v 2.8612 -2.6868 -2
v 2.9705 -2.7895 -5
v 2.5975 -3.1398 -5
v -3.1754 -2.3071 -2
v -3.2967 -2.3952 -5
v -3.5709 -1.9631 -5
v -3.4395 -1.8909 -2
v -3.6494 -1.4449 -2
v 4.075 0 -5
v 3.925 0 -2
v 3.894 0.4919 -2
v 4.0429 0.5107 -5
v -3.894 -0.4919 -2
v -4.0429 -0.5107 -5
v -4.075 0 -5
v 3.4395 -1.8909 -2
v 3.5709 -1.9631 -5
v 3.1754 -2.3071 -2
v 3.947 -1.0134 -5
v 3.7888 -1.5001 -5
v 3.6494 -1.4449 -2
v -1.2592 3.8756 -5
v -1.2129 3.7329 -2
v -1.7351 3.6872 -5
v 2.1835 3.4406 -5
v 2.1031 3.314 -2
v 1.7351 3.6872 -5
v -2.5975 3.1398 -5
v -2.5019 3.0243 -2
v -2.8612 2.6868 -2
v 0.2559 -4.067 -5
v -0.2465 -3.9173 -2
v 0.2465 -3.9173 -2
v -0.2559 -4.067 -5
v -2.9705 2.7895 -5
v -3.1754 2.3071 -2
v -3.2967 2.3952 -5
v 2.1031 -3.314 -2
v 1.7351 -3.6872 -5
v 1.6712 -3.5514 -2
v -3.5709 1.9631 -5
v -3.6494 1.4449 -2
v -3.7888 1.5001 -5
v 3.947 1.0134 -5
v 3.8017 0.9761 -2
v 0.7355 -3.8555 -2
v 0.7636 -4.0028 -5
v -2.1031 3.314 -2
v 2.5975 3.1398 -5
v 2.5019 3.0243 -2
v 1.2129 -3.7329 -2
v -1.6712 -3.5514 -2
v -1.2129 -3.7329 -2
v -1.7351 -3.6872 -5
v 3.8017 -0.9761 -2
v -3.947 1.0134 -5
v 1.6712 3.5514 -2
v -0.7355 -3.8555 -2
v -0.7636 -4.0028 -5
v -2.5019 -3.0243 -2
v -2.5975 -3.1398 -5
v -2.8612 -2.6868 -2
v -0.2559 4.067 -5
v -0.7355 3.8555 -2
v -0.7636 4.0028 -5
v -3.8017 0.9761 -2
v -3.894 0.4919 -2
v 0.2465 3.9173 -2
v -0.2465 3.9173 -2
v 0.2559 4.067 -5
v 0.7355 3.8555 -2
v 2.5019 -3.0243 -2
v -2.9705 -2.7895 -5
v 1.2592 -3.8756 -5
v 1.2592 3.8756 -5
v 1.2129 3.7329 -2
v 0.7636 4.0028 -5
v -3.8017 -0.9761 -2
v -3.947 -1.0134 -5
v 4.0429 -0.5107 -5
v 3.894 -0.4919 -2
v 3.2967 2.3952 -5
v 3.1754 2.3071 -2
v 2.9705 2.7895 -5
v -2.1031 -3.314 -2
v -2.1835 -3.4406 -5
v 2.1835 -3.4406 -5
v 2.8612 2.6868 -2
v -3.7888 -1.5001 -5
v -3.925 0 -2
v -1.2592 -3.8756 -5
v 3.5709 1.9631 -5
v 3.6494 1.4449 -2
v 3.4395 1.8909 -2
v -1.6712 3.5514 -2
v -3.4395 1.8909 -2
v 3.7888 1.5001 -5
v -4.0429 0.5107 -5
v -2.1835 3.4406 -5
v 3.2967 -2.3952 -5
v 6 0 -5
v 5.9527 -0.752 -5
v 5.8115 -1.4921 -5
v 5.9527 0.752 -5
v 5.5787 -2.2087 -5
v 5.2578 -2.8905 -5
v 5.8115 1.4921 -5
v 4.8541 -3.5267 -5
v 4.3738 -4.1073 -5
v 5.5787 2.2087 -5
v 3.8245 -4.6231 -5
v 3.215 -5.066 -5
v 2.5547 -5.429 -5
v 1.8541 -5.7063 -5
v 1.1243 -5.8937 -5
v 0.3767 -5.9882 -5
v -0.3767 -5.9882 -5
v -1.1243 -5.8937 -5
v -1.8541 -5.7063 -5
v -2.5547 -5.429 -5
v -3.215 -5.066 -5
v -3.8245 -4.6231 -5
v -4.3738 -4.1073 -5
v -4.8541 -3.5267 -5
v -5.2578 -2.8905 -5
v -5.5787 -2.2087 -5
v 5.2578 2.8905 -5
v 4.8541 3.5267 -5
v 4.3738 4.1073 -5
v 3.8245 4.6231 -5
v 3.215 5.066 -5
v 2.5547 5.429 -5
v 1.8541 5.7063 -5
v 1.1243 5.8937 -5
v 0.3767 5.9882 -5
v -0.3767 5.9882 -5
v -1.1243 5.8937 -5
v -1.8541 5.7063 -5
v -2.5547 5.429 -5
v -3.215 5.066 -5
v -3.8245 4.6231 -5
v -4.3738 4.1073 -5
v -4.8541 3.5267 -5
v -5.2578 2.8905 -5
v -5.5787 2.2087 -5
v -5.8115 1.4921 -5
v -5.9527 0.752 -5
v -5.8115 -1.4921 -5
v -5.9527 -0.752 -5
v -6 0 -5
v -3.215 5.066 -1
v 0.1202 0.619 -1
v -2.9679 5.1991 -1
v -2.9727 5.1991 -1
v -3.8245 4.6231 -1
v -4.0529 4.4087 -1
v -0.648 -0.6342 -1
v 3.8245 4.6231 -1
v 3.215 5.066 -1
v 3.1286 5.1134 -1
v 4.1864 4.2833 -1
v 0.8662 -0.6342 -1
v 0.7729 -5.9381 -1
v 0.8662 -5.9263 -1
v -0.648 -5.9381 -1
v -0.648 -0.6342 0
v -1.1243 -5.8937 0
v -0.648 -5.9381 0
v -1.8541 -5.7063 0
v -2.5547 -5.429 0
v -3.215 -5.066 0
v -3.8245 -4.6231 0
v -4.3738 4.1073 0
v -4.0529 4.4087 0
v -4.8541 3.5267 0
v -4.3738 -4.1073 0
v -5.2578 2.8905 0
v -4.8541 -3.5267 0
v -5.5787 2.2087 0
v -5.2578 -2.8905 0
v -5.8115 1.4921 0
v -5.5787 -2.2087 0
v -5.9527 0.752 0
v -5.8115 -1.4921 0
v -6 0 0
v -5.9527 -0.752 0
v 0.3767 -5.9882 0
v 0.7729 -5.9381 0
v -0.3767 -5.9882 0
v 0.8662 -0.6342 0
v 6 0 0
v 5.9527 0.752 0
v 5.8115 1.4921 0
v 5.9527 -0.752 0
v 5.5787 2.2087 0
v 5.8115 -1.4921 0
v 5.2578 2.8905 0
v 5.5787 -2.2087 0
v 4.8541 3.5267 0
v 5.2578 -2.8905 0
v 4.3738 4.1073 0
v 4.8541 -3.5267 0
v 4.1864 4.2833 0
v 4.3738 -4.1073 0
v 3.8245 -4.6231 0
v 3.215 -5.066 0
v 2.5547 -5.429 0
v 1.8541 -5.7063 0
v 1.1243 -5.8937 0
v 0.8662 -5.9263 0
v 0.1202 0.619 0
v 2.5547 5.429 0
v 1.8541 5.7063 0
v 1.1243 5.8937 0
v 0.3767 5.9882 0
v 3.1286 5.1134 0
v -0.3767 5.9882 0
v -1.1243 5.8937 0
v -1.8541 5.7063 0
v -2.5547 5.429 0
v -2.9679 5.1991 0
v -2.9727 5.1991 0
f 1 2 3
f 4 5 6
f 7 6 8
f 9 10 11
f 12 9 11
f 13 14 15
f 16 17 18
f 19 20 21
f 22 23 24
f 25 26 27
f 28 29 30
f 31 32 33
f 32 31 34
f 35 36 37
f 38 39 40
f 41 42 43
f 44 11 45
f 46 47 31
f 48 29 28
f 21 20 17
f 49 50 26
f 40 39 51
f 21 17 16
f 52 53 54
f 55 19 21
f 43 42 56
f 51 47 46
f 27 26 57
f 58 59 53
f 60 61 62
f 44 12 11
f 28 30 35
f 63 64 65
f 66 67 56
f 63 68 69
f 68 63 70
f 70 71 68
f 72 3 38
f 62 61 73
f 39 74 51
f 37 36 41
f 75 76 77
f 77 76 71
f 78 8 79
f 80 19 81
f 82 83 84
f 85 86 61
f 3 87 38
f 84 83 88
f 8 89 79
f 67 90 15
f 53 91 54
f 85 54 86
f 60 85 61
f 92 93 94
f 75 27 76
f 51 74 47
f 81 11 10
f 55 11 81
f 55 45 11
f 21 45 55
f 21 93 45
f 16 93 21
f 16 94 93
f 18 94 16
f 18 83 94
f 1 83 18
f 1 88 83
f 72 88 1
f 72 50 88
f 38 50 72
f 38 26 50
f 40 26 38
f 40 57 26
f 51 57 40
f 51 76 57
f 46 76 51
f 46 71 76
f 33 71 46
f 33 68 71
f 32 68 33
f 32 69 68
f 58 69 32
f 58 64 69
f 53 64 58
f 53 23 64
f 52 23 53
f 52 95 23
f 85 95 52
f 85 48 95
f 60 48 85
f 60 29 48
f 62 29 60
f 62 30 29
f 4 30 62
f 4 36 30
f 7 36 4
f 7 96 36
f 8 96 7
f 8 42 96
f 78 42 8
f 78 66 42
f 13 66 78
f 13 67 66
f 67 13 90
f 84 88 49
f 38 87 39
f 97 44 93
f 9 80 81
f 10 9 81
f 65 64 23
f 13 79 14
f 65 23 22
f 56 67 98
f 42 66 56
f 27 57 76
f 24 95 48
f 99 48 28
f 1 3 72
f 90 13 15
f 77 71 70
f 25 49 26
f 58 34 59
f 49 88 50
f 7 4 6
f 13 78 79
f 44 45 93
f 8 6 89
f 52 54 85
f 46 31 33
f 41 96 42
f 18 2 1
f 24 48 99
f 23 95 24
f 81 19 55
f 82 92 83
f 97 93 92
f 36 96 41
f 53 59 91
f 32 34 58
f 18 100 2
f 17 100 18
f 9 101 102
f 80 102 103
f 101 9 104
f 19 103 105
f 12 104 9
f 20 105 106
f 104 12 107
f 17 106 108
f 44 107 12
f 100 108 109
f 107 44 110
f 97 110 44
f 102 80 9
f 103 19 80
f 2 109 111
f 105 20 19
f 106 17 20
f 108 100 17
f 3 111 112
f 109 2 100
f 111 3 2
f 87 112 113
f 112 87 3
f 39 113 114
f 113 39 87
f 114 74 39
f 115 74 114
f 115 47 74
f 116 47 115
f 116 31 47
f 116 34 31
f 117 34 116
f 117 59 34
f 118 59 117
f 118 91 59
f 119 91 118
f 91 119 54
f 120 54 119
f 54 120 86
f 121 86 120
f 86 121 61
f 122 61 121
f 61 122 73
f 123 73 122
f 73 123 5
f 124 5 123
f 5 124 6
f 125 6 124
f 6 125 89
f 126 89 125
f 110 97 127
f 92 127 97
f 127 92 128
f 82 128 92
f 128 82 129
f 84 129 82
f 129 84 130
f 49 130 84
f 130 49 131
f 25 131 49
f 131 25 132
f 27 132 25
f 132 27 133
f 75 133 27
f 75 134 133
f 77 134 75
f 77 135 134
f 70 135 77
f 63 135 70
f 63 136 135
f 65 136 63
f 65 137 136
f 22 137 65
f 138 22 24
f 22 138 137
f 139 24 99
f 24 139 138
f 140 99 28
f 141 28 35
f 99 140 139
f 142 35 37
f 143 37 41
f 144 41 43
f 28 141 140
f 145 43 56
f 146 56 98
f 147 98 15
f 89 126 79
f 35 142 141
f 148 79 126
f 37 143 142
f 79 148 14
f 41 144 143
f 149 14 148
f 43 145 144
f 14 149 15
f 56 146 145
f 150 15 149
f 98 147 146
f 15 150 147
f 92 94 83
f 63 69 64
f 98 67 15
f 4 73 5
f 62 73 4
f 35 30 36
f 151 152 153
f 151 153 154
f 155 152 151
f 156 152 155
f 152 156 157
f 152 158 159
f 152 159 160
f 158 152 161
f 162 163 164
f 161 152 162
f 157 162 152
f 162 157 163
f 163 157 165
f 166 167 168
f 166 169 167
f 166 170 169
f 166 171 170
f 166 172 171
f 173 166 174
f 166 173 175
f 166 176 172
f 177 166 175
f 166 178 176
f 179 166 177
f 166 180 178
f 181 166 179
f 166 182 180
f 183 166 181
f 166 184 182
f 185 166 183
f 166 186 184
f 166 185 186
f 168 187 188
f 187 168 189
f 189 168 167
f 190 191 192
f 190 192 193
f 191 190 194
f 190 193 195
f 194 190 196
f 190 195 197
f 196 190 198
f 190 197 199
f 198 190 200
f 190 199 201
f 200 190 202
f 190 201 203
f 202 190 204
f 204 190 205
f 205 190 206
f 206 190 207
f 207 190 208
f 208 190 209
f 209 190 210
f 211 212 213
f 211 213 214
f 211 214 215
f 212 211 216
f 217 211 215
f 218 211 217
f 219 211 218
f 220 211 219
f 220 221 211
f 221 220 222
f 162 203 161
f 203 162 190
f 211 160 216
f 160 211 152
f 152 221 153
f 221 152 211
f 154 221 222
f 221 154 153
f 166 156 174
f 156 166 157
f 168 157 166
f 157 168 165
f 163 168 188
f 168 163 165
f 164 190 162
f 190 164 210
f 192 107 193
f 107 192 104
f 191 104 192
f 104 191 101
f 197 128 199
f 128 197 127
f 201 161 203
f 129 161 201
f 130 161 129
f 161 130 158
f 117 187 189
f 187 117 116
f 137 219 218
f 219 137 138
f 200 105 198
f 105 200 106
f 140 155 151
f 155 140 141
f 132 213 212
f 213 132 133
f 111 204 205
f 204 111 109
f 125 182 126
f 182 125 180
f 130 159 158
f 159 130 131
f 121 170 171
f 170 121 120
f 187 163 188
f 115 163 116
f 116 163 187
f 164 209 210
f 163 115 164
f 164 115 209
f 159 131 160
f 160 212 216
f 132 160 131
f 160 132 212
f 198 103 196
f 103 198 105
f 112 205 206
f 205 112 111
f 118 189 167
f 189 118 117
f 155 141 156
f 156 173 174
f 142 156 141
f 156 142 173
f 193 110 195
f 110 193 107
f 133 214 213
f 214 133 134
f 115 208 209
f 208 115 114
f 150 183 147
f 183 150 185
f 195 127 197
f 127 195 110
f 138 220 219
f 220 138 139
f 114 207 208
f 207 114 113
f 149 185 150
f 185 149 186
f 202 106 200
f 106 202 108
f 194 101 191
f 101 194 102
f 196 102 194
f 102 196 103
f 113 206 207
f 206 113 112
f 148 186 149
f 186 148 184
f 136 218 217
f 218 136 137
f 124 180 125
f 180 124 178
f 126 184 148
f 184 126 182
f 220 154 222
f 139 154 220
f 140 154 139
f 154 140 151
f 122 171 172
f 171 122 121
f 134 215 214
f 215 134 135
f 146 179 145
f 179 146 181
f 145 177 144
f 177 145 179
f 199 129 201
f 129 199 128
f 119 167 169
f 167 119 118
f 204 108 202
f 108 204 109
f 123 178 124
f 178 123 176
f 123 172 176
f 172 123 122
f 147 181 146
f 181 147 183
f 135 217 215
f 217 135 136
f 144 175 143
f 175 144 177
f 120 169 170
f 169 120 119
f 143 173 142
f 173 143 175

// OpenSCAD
$fn = 50;

difference() {
	union() {
		translate(v = [0, 0, -5.0]) {
			cylinder(h = 5, r = 6.0);
		}
	}
	union() {
		#translate(v = [0, 0, -5.0]) {
			cylinder(h = 3, r1 = 4.075, r2 = 3.925);
		}
		translate(v = [0, -0.5, -1]) {
			linear_extrude(height = 1) {
				text(font = "Webdings", halign = "center", size = 11, text = "Y", valign = "center");
			}
		}
	}
}
